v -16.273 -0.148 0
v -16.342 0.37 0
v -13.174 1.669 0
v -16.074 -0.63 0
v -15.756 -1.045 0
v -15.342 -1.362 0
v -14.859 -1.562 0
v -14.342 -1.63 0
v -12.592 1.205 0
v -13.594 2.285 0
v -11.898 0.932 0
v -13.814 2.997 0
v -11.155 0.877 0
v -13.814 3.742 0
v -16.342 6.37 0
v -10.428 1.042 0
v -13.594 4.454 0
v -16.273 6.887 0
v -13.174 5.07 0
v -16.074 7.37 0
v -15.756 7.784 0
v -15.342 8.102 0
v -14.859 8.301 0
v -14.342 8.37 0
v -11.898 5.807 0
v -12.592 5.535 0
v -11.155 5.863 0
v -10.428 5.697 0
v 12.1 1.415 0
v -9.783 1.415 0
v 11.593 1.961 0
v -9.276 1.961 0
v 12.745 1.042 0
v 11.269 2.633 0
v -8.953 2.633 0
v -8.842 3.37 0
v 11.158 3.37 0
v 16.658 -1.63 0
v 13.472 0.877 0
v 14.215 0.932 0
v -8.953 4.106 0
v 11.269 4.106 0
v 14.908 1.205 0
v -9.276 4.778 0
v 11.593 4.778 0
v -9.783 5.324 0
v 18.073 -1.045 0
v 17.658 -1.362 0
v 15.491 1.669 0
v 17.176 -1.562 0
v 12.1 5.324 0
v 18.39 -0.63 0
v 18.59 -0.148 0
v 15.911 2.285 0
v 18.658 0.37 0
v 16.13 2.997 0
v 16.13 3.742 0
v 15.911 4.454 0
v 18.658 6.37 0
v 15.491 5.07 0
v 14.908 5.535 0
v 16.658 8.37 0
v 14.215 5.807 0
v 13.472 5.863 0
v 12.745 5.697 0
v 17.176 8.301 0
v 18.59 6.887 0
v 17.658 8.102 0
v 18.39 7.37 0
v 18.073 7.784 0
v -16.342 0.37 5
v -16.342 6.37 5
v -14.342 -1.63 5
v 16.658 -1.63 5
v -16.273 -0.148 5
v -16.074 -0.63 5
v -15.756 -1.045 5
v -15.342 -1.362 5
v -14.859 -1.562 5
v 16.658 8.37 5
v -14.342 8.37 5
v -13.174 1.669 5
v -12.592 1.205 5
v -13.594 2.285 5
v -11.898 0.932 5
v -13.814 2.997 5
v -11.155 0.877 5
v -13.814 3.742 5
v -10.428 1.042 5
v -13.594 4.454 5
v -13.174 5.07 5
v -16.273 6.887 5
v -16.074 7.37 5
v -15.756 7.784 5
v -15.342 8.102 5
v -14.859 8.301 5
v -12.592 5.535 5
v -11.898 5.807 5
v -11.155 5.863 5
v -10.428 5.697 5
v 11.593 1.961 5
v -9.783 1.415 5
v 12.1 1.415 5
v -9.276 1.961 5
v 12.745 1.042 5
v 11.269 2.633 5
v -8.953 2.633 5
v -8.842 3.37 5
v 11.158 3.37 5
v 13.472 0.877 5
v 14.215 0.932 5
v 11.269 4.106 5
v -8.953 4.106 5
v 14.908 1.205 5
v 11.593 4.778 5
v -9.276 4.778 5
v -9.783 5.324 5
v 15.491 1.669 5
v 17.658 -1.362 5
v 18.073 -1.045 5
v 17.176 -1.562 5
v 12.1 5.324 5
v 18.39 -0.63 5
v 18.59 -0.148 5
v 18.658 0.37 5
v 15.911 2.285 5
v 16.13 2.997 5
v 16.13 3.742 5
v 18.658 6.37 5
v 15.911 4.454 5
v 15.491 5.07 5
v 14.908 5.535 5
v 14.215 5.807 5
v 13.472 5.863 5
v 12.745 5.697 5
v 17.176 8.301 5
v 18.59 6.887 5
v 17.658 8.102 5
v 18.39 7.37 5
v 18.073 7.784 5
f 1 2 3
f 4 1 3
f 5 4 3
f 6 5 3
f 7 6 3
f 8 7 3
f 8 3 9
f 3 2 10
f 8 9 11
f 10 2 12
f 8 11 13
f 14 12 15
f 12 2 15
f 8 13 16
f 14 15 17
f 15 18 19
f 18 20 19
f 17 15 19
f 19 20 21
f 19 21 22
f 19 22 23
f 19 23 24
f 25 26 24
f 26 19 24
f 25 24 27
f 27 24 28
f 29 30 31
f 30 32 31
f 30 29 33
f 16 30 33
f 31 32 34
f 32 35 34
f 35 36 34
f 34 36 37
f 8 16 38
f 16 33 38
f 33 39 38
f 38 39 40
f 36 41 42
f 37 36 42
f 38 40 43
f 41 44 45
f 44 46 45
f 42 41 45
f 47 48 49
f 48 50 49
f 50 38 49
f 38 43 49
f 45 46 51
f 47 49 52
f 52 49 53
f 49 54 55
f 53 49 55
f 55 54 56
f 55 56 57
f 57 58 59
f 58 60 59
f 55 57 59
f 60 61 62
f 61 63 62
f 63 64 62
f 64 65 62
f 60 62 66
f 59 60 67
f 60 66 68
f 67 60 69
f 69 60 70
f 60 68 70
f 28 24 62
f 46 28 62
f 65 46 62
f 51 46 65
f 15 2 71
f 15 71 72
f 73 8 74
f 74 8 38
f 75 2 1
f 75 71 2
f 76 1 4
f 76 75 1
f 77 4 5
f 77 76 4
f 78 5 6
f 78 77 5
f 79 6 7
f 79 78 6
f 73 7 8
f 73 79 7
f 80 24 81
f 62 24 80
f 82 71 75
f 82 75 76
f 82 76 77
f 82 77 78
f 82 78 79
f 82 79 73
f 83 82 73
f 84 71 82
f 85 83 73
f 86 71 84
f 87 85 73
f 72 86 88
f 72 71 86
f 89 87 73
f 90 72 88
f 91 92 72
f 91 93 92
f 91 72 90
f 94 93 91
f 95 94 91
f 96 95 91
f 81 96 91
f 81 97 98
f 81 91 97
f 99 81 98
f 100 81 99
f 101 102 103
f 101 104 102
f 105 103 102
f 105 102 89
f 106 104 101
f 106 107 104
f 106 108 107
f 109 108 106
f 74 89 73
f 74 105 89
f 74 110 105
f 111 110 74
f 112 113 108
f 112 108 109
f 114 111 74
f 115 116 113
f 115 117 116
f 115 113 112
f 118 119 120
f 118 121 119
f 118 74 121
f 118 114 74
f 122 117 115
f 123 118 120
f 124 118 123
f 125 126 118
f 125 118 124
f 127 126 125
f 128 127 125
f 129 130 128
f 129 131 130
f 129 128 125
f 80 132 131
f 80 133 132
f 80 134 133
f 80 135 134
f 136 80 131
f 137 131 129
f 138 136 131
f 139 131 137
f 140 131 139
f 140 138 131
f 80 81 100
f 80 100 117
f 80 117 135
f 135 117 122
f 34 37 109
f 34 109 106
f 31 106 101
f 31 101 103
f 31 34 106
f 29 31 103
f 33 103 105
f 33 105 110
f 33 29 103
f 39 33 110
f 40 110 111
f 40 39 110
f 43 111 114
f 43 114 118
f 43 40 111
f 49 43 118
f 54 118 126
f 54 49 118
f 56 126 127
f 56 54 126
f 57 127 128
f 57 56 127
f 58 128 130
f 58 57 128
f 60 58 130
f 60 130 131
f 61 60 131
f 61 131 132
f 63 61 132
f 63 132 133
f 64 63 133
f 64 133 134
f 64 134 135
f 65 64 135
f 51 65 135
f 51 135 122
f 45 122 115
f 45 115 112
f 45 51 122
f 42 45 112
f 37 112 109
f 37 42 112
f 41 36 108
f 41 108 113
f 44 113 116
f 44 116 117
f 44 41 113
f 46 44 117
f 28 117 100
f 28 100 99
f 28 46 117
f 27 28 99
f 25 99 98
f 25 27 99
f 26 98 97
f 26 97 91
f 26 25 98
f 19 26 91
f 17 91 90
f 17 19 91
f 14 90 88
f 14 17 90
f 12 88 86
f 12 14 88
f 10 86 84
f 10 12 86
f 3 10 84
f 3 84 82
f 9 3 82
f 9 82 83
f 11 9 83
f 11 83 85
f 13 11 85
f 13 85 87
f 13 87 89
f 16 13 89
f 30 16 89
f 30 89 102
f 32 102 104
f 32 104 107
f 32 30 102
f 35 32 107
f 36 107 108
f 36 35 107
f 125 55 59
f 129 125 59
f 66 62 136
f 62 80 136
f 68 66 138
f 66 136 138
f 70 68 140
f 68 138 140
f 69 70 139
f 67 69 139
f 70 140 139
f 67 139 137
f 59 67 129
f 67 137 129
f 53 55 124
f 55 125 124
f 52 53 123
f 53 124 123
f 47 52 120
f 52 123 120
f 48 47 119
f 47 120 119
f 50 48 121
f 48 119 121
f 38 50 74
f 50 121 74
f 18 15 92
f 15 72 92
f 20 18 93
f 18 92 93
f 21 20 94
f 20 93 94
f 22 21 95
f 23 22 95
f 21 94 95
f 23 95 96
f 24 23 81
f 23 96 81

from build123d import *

# Parameters (mm, degrees)
ESQUISSE1_W        = 35
ESQUISSE1_H        = 10
ESQUISSE1_R        = 2.5
BOSS_EXTRU_1_DEPTH = 5
CONG_1_R           = 2
CONG_2_R           = 2
CONG_3_R           = 2
CONG_4_R           = 2


with BuildPart() as part:
    # Esquisse1 → Boss.-Extru.1 (new body)
    with BuildSketch(Plane.XY):
        with Locations((1.158413849, 3.369565217)):
            Rectangle(ESQUISSE1_W, ESQUISSE1_H)
        with Locations((-11.341586151, 3.369565217)):
            Circle(ESQUISSE1_R, mode=Mode.SUBTRACT)
        with Locations(Location((13.658413849, 3.369565217, 0), (0, 0, 180))):
            Circle(ESQUISSE1_R, mode=Mode.SUBTRACT)
    extrude(amount=BOSS_EXTRU_1_DEPTH)

    # Congé1
    cong_1_edges = [part.edges().sort_by_distance(p)[0] for p in [
        (-16.341586151, 8.369565217, 2.5),
    ]]
    fillet(cong_1_edges, radius=CONG_1_R)

    # Congé2
    cong_2_edges = [part.edges().sort_by_distance(p)[0] for p in [
        (-16.341586151, -1.630434783, 2.5),
    ]]
    fillet(cong_2_edges, radius=CONG_2_R)

    # Congé3
    cong_3_edges = [part.edges().sort_by_distance(p)[0] for p in [
        (18.658413849, 8.369565217, 2.5),
    ]]
    fillet(cong_3_edges, radius=CONG_3_R)

    # Congé4
    cong_4_edges = [part.edges().sort_by_distance(p)[0] for p in [
        (18.658413849, -1.630434783, 2.5),
    ]]
    fillet(cong_4_edges, radius=CONG_4_R)


solid = part.part
